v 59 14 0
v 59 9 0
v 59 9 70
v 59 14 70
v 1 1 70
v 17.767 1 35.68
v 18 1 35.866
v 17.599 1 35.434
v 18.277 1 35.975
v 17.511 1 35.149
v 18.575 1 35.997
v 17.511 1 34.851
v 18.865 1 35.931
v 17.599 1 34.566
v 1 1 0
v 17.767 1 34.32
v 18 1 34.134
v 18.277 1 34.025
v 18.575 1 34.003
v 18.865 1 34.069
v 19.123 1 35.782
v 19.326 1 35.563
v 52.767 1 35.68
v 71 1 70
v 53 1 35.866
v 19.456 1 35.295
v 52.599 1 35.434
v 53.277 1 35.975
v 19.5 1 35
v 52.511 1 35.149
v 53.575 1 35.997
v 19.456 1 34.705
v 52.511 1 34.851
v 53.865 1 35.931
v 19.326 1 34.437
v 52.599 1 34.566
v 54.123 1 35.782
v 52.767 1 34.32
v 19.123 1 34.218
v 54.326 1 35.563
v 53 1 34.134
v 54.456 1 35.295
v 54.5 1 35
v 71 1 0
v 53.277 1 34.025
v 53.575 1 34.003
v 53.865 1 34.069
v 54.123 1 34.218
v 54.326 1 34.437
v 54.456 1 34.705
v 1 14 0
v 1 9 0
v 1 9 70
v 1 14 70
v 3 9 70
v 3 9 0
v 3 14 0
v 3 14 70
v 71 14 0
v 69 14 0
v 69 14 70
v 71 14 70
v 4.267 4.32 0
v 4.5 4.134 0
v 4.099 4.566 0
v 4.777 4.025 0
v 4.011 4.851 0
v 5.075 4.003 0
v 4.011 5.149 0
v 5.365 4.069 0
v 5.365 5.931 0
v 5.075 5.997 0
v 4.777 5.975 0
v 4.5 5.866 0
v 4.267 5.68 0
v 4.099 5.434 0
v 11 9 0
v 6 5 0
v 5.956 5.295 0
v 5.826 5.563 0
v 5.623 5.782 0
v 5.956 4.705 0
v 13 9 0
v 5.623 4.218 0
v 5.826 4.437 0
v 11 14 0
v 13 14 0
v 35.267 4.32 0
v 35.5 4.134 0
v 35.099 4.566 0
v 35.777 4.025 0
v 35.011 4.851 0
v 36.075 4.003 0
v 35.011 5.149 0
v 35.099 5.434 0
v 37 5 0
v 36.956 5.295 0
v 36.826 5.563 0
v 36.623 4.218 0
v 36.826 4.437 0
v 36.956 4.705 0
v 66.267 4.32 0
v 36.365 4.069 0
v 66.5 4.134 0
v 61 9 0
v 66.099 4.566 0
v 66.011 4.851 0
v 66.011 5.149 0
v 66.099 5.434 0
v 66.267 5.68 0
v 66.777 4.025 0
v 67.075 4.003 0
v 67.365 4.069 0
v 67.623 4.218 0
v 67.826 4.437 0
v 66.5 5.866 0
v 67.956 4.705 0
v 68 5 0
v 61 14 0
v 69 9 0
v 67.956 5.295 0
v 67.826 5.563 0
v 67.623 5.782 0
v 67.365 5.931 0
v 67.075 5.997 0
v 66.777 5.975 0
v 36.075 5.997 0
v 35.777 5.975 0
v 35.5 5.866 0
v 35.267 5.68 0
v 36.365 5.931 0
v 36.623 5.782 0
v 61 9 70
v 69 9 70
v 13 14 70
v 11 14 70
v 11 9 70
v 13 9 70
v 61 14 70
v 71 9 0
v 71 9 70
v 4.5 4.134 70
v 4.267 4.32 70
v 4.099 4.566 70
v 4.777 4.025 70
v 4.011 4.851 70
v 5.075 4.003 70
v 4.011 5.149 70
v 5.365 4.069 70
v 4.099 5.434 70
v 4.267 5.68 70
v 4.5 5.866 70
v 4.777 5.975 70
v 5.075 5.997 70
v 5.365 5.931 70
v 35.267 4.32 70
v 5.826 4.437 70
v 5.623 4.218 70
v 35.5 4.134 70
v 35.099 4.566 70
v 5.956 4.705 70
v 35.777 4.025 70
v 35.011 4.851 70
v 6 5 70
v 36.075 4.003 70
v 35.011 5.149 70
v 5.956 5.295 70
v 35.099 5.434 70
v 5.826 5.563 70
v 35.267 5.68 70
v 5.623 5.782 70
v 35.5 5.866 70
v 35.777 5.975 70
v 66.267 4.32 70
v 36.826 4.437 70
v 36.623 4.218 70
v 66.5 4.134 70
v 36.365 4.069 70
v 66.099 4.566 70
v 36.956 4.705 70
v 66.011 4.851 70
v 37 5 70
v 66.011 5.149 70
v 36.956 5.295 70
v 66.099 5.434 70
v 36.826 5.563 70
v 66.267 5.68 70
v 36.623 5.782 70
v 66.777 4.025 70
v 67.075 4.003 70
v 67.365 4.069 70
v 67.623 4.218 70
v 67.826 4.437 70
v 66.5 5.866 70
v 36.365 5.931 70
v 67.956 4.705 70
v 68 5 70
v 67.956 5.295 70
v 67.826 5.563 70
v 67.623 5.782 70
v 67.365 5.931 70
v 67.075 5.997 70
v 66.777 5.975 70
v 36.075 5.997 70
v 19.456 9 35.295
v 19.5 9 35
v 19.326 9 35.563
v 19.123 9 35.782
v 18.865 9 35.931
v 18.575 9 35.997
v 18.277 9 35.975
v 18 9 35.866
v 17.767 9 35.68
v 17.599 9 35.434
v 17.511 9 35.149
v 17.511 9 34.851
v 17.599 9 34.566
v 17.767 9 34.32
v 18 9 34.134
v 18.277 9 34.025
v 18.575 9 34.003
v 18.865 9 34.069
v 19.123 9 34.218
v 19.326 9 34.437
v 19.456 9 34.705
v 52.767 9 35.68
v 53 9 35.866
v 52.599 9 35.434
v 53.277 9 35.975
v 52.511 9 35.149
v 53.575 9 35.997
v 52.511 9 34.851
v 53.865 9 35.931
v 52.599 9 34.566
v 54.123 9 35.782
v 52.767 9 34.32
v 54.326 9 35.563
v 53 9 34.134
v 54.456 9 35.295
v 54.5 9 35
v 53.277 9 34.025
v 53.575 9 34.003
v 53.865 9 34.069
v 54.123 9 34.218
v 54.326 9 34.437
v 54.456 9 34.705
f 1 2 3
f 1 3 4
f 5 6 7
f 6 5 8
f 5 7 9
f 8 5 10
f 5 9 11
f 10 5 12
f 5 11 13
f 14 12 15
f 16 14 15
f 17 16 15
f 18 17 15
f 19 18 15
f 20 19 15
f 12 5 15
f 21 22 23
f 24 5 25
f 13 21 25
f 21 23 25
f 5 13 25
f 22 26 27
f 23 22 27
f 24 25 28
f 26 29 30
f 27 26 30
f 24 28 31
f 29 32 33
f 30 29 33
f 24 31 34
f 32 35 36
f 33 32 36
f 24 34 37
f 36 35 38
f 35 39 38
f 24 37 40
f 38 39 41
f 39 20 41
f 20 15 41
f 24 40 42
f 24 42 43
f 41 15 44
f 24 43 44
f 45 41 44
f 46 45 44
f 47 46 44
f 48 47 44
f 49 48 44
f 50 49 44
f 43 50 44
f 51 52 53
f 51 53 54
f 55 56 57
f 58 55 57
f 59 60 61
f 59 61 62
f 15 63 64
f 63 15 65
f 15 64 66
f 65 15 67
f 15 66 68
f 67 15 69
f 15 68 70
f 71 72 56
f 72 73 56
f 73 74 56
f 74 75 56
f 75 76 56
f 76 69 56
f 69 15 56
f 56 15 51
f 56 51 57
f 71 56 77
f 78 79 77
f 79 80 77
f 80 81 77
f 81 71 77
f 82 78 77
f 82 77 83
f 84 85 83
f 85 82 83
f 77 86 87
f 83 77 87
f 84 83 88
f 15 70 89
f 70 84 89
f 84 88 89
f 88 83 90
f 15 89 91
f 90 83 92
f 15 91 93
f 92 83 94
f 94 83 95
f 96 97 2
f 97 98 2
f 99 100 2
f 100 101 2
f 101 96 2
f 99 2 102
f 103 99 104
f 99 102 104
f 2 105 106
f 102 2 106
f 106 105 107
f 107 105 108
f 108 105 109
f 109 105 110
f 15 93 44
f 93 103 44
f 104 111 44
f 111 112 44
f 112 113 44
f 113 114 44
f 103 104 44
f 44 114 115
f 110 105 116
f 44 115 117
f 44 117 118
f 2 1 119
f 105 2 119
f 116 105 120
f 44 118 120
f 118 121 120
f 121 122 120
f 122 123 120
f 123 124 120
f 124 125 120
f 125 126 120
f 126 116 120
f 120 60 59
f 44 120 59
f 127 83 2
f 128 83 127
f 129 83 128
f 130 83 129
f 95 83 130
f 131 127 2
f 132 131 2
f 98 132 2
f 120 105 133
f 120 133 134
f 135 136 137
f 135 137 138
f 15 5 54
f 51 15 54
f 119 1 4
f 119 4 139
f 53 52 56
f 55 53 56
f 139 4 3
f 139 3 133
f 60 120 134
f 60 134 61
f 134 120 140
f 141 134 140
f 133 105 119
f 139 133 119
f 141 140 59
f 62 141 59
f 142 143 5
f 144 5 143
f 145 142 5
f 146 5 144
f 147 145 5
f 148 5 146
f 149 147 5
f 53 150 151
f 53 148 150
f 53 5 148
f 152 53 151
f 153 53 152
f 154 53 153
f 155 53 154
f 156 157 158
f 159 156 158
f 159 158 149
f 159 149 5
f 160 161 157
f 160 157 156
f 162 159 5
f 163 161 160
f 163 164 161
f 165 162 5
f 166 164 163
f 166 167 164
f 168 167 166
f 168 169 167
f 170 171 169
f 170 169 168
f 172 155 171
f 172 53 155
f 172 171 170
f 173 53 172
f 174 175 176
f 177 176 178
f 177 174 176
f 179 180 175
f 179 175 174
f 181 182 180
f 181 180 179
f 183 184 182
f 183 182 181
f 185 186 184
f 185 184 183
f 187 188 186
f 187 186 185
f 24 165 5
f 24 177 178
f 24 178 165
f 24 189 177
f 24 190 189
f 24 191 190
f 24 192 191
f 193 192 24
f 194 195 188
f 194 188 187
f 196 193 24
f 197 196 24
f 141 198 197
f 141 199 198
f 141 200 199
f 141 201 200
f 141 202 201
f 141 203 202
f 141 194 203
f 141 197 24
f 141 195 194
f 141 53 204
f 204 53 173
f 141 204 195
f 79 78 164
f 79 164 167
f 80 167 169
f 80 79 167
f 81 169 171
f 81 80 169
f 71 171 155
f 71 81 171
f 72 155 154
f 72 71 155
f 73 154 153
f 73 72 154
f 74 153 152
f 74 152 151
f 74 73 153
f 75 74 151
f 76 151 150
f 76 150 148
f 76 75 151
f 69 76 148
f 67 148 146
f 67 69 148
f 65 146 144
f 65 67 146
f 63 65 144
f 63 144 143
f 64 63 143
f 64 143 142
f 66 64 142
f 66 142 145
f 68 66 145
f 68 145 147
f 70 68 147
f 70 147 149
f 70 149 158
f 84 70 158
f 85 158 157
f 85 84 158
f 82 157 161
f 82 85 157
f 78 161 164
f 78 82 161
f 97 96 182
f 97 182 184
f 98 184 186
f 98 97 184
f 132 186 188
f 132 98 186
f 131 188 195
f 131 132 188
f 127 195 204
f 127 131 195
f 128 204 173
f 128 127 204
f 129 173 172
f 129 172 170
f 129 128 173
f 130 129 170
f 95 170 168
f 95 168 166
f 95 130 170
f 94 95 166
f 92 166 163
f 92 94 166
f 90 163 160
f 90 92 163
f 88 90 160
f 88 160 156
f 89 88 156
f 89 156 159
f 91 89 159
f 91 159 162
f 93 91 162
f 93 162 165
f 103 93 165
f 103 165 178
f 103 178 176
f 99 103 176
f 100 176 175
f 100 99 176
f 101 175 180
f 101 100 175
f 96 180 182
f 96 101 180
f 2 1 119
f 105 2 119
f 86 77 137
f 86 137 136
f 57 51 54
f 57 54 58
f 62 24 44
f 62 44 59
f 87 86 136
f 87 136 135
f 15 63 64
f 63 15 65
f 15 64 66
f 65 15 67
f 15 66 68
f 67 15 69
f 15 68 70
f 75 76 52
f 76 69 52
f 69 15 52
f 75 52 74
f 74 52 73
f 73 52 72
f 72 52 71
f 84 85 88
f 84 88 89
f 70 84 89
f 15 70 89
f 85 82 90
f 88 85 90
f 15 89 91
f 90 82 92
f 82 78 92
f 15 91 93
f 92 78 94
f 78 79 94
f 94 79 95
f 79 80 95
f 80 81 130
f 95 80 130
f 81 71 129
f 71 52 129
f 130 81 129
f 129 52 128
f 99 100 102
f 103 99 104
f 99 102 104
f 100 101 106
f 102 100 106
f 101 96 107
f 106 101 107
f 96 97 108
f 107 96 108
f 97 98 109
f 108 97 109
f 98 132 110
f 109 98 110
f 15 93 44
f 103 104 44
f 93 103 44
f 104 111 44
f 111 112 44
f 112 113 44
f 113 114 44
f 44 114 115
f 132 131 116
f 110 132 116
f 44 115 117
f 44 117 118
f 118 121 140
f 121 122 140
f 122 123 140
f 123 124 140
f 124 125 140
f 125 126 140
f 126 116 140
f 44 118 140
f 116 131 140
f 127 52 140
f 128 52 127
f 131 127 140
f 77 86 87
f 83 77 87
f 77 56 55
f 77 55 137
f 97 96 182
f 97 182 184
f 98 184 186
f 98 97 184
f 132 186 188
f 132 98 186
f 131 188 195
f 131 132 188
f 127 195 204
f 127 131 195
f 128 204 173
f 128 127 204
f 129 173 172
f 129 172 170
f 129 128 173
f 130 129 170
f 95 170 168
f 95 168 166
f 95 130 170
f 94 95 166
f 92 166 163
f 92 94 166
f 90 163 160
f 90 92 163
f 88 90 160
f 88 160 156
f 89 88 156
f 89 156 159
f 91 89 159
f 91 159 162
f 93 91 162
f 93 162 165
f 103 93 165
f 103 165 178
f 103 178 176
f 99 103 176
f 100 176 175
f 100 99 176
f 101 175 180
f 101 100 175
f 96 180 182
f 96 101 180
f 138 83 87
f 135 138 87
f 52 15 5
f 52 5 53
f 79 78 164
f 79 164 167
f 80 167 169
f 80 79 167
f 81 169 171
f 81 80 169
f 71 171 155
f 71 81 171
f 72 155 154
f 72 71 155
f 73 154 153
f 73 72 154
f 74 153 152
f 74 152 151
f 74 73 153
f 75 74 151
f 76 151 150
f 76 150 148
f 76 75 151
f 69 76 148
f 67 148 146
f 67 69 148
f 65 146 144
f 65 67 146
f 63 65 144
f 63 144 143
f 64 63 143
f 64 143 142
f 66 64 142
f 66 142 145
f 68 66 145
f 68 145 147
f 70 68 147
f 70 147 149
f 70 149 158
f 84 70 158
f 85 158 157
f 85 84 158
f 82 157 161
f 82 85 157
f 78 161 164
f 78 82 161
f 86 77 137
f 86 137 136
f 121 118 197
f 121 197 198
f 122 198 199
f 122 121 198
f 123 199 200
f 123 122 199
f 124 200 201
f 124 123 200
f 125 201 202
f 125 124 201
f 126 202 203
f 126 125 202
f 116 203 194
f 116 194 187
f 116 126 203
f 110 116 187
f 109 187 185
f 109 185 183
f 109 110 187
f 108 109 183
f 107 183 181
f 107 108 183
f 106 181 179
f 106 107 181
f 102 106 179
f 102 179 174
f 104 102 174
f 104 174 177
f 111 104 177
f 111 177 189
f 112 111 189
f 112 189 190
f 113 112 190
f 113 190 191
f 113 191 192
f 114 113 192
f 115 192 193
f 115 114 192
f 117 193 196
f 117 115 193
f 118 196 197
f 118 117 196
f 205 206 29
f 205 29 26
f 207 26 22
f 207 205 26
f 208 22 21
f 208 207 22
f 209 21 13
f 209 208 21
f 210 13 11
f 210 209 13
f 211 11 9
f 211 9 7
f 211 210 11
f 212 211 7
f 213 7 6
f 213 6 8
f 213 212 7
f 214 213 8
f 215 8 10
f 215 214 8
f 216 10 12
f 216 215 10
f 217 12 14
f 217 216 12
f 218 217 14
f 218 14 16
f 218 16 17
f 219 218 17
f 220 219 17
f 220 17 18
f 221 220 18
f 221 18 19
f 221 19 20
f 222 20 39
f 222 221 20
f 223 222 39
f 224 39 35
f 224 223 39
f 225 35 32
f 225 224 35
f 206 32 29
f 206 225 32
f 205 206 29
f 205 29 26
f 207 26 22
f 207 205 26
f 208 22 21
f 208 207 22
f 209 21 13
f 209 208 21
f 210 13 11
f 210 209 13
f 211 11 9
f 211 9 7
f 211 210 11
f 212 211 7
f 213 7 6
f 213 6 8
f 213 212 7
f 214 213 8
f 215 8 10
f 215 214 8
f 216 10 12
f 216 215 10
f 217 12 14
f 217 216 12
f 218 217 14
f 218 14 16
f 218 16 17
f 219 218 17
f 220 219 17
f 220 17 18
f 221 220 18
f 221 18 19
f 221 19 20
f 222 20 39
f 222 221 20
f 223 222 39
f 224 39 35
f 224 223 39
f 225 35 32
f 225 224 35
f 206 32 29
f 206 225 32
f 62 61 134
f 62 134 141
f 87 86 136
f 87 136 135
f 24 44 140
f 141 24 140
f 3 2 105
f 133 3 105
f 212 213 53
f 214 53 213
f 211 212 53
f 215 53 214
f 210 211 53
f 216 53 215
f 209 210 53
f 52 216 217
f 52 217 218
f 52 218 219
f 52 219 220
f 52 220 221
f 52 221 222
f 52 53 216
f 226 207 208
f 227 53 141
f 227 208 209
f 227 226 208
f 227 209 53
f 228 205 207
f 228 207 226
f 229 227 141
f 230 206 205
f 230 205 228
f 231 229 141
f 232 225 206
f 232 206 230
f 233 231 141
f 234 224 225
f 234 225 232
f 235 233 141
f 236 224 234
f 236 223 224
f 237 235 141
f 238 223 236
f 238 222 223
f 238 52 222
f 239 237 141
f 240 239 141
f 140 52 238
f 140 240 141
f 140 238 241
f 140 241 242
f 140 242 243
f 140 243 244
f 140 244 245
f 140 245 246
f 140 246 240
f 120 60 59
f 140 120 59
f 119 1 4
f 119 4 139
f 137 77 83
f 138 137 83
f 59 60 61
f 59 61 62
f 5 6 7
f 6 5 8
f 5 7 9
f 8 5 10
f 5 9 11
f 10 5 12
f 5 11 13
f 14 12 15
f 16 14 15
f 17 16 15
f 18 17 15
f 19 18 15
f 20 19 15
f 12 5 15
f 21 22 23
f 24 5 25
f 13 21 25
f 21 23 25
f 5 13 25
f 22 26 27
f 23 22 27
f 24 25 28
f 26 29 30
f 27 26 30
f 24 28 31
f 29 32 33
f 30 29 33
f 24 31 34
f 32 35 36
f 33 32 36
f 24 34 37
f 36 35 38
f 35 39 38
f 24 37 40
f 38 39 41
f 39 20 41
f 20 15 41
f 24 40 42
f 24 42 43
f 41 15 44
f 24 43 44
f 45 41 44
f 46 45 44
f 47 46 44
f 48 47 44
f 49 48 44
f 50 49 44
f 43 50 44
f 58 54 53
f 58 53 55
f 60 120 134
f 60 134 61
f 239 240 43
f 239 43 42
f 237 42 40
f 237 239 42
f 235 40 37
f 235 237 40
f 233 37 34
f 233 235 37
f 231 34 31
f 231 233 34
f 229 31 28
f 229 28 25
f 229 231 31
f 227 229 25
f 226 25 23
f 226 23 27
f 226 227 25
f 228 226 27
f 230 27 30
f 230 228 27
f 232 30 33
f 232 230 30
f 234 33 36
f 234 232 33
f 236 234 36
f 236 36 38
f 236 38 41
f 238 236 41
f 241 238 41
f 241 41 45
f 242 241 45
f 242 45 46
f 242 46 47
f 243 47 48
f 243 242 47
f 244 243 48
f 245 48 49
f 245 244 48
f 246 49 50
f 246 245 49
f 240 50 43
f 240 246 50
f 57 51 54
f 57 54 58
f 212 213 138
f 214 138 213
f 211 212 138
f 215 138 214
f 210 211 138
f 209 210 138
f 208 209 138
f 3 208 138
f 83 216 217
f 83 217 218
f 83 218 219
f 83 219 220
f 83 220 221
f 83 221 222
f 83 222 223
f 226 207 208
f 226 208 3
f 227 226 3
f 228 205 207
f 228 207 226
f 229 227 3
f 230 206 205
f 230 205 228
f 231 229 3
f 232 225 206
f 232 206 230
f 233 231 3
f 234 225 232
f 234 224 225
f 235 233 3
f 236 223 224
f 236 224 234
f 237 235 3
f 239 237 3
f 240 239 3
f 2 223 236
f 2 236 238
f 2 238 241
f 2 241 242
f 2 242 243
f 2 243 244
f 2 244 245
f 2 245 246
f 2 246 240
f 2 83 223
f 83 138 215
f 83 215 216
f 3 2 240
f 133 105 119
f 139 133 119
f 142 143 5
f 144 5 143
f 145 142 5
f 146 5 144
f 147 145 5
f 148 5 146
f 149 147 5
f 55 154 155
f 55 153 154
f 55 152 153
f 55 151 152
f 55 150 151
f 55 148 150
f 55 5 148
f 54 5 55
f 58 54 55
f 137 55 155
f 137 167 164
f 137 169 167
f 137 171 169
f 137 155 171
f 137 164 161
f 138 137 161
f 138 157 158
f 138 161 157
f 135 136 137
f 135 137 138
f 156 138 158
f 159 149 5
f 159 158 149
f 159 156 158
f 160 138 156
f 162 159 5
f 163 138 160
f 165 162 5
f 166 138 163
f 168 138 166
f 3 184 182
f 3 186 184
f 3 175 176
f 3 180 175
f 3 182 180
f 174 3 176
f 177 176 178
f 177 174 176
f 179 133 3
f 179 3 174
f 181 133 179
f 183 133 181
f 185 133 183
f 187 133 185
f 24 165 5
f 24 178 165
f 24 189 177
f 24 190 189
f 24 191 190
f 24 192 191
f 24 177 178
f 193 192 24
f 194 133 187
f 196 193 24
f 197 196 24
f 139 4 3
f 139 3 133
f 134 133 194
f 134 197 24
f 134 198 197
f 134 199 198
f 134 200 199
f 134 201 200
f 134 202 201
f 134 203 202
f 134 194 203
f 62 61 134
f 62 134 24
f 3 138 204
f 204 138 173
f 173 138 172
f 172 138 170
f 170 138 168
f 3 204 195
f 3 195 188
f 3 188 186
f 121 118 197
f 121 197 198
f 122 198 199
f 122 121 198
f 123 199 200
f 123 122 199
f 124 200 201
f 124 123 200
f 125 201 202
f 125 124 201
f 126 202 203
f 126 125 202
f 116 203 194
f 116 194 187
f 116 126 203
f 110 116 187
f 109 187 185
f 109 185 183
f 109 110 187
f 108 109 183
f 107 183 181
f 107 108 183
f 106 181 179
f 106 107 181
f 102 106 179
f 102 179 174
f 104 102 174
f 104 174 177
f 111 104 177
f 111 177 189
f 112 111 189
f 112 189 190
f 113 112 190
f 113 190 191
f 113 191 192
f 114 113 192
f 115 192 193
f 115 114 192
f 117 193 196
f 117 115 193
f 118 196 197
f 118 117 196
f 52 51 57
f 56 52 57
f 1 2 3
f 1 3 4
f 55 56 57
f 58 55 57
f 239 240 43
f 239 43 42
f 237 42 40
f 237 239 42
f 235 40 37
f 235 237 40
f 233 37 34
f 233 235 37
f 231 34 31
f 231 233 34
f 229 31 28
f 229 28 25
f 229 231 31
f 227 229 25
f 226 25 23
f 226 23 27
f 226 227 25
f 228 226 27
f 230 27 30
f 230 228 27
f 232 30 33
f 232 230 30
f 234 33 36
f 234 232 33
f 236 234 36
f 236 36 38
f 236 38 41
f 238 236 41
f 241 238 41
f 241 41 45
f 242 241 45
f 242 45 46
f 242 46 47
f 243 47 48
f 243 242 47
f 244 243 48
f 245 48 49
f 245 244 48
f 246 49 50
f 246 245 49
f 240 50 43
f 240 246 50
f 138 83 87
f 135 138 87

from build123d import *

# Parameters (mm, degrees)
BOX008_W          = 2
BOX008_H          = 5
BOX008_DEPTH      = 70
BOX009_W          = 2
BOX009_H          = 5
BOX009_DEPTH      = 70
BOX010_W          = 2
BOX010_H          = 5
BOX010_DEPTH      = 70
BOX011_W          = 2
BOX011_H          = 5
BOX011_DEPTH      = 70
BOX003_W          = 2
BOX003_H          = 5
BOX003_DEPTH      = 70
BOX004_W          = 2
BOX004_H          = 5
BOX004_DEPTH      = 70
BOX002_W          = 2
BOX002_H          = 5
BOX002_DEPTH      = 70
CYLINDER004_R     = 1
CYLINDER004_DEPTH = 8
CYLINDER003_R     = 1
CYLINDER003_DEPTH = 8
CYLINDER_R        = 1
CYLINDER_DEPTH    = 70
CYLINDER002_R     = 1
CYLINDER002_DEPTH = 70
CYLINDER001_R     = 1
CYLINDER001_DEPTH = 70
BOX001_W          = 70
BOX001_H          = 8
BOX001_DEPTH      = 70
BOX_W             = 2
BOX_H             = 5
BOX_DEPTH         = 70
CYLINDER009_R     = 1
CYLINDER009_DEPTH = 8
CYLINDER008_R     = 1
CYLINDER008_DEPTH = 8
CYLINDER005_R     = 1
CYLINDER005_DEPTH = 70
CYLINDER006_R     = 1
CYLINDER006_DEPTH = 70
CYLINDER007_R     = 1
CYLINDER007_DEPTH = 70
BOX007_W          = 70
BOX007_H          = 8
BOX007_DEPTH      = 70


with BuildPart() as w_rfel008:
    # Box008 → Box008 (new body)
    with BuildSketch(Plane(origin=(1, 9, 0), x_dir=(1, 0, 0), z_dir=(0, 0, 1))):
        with Locations((1, 2.5)):
            Rectangle(BOX008_W, BOX008_H)
    extrude(amount=BOX008_DEPTH)


with BuildPart() as w_rfel009:
    # Box009 → Box009 (new body)
    with BuildSketch(Plane(origin=(11, 9, 0), x_dir=(1, 0, 0), z_dir=(0, 0, 1))):
        with Locations((1, 2.5)):
            Rectangle(BOX009_W, BOX009_H)
    extrude(amount=BOX009_DEPTH)


with BuildPart() as w_rfel010:
    # Box010 → Box010 (new body)
    with BuildSketch(Plane(origin=(69, 9, 0), x_dir=(1, 0, 0), z_dir=(0, 0, 1))):
        with Locations((1, 2.5)):
            Rectangle(BOX010_W, BOX010_H)
    extrude(amount=BOX010_DEPTH)


with BuildPart() as w_rfel011:
    # Box011 → Box011 (new body)
    with BuildSketch(Plane(origin=(59, 9, 0), x_dir=(1, 0, 0), z_dir=(0, 0, 1))):
        with Locations((1, 2.5)):
            Rectangle(BOX011_W, BOX011_H)
    extrude(amount=BOX011_DEPTH)


with BuildPart() as w_rfel003:
    # Box003 → Box003 (new body)
    with BuildSketch(Plane(origin=(69, 9, 0), x_dir=(1, 0, 0), z_dir=(0, 0, 1))):
        with Locations((1, 2.5)):
            Rectangle(BOX003_W, BOX003_H)
    extrude(amount=BOX003_DEPTH)


with BuildPart() as w_rfel004:
    # Box004 → Box004 (new body)
    with BuildSketch(Plane(origin=(59, 9, 0), x_dir=(1, 0, 0), z_dir=(0, 0, 1))):
        with Locations((1, 2.5)):
            Rectangle(BOX004_W, BOX004_H)
    extrude(amount=BOX004_DEPTH)


with BuildPart() as w_rfel002:
    # Box002 → Box002 (new body)
    with BuildSketch(Plane(origin=(11, 9, 0), x_dir=(1, 0, 0), z_dir=(0, 0, 1))):
        with Locations((1, 2.5)):
            Rectangle(BOX002_W, BOX002_H)
    extrude(amount=BOX002_DEPTH)


with BuildPart() as zylinder004:
    # Cylinder004 → Cylinder004 (new body)
    with BuildSketch(Plane(origin=(53.5, 9, 35), x_dir=(1, 0, 0), z_dir=(0, -1, 0))):
        Circle(CYLINDER004_R)
    extrude(amount=CYLINDER004_DEPTH)


with BuildPart() as zylinder003:
    # Cylinder003 → Cylinder003 (new body)
    with BuildSketch(Plane(origin=(18.5, 9, 35), x_dir=(1, 0, 0), z_dir=(0, -1, 0))):
        Circle(CYLINDER003_R)
    extrude(amount=CYLINDER003_DEPTH)


with BuildPart() as zylinder:
    # Cylinder → Cylinder (new body)
    with BuildSketch(Plane(origin=(36, 5, 0), x_dir=(1, 0, 0), z_dir=(0, 0, 1))):
        Circle(CYLINDER_R)
    extrude(amount=CYLINDER_DEPTH)


with BuildPart() as zylinder002:
    # Cylinder002 → Cylinder002 (new body)
    with BuildSketch(Plane(origin=(67, 5, 0), x_dir=(1, 0, 0), z_dir=(0, 0, 1))):
        Circle(CYLINDER002_R)
    extrude(amount=CYLINDER002_DEPTH)


with BuildPart() as zylinder001:
    # Cylinder001 → Cylinder001 (new body)
    with BuildSketch(Plane(origin=(5, 5, 0), x_dir=(1, 0, 0), z_dir=(0, 0, 1))):
        Circle(CYLINDER001_R)
    extrude(amount=CYLINDER001_DEPTH)


with BuildPart() as cut004:
    # Box001 → Box001 (new body)
    with BuildSketch(Plane(origin=(1, 1, 0), x_dir=(1, 0, 0), z_dir=(0, 0, 1))):
        with Locations((35, 4)):
            Rectangle(BOX001_W, BOX001_H)
    extrude(amount=BOX001_DEPTH)

    # Cut: cut Zylinder001
    add(zylinder001.part, mode=Mode.SUBTRACT)

    # Cut001: cut Zylinder002
    add(zylinder002.part, mode=Mode.SUBTRACT)

    # Cut002: cut Zylinder
    add(zylinder.part, mode=Mode.SUBTRACT)

    # Cut003: cut Zylinder003
    add(zylinder003.part, mode=Mode.SUBTRACT)

    # Cut004: cut Zylinder004
    add(zylinder004.part, mode=Mode.SUBTRACT)


with BuildPart() as fusion:
    # Box → Box (new body)
    with BuildSketch(Plane(origin=(1, 9, 0), x_dir=(1, 0, 0), z_dir=(0, 0, 1))):
        with Locations((1, 2.5)):
            Rectangle(BOX_W, BOX_H)
    extrude(amount=BOX_DEPTH)

    # Fusion: union Würfel003, Würfel004, Würfel002, Cut004
    add(w_rfel003.part)
    add(w_rfel004.part)
    add(w_rfel002.part)
    add(cut004.part)


with BuildPart() as zylinder009:
    # Cylinder009 → Cylinder009 (new body)
    with BuildSketch(Plane(origin=(53.5, 9, 35), x_dir=(1, 0, 0), z_dir=(0, -1, 0))):
        Circle(CYLINDER009_R)
    extrude(amount=CYLINDER009_DEPTH)


with BuildPart() as zylinder008:
    # Cylinder008 → Cylinder008 (new body)
    with BuildSketch(Plane(origin=(18.5, 9, 35), x_dir=(1, 0, 0), z_dir=(0, -1, 0))):
        Circle(CYLINDER008_R)
    extrude(amount=CYLINDER008_DEPTH)


with BuildPart() as zylinder005:
    # Cylinder005 → Cylinder005 (new body)
    with BuildSketch(Plane(origin=(36, 5, 0), x_dir=(1, 0, 0), z_dir=(0, 0, 1))):
        Circle(CYLINDER005_R)
    extrude(amount=CYLINDER005_DEPTH)


with BuildPart() as zylinder006:
    # Cylinder006 → Cylinder006 (new body)
    with BuildSketch(Plane(origin=(67, 5, 0), x_dir=(1, 0, 0), z_dir=(0, 0, 1))):
        Circle(CYLINDER006_R)
    extrude(amount=CYLINDER006_DEPTH)


with BuildPart() as zylinder007:
    # Cylinder007 → Cylinder007 (new body)
    with BuildSketch(Plane(origin=(5, 5, 0), x_dir=(1, 0, 0), z_dir=(0, 0, 1))):
        Circle(CYLINDER007_R)
    extrude(amount=CYLINDER007_DEPTH)


with BuildPart() as cut008:
    # Box007 → Box007 (new body)
    with BuildSketch(Plane(origin=(1, 1, 0), x_dir=(1, 0, 0), z_dir=(0, 0, 1))):
        with Locations((35, 4)):
            Rectangle(BOX007_W, BOX007_H)
    extrude(amount=BOX007_DEPTH)

    # Cut005: cut Zylinder007
    add(zylinder007.part, mode=Mode.SUBTRACT)

    # Cut009: cut Zylinder006
    add(zylinder006.part, mode=Mode.SUBTRACT)

    # Cut007: cut Zylinder005
    add(zylinder005.part, mode=Mode.SUBTRACT)

    # Cut006: cut Zylinder008
    add(zylinder008.part, mode=Mode.SUBTRACT)

    # Cut008: cut Zylinder009
    add(zylinder009.part, mode=Mode.SUBTRACT)


solid = Compound([w_rfel008.part, w_rfel009.part, w_rfel010.part, w_rfel011.part, fusion.part, cut008.part])
